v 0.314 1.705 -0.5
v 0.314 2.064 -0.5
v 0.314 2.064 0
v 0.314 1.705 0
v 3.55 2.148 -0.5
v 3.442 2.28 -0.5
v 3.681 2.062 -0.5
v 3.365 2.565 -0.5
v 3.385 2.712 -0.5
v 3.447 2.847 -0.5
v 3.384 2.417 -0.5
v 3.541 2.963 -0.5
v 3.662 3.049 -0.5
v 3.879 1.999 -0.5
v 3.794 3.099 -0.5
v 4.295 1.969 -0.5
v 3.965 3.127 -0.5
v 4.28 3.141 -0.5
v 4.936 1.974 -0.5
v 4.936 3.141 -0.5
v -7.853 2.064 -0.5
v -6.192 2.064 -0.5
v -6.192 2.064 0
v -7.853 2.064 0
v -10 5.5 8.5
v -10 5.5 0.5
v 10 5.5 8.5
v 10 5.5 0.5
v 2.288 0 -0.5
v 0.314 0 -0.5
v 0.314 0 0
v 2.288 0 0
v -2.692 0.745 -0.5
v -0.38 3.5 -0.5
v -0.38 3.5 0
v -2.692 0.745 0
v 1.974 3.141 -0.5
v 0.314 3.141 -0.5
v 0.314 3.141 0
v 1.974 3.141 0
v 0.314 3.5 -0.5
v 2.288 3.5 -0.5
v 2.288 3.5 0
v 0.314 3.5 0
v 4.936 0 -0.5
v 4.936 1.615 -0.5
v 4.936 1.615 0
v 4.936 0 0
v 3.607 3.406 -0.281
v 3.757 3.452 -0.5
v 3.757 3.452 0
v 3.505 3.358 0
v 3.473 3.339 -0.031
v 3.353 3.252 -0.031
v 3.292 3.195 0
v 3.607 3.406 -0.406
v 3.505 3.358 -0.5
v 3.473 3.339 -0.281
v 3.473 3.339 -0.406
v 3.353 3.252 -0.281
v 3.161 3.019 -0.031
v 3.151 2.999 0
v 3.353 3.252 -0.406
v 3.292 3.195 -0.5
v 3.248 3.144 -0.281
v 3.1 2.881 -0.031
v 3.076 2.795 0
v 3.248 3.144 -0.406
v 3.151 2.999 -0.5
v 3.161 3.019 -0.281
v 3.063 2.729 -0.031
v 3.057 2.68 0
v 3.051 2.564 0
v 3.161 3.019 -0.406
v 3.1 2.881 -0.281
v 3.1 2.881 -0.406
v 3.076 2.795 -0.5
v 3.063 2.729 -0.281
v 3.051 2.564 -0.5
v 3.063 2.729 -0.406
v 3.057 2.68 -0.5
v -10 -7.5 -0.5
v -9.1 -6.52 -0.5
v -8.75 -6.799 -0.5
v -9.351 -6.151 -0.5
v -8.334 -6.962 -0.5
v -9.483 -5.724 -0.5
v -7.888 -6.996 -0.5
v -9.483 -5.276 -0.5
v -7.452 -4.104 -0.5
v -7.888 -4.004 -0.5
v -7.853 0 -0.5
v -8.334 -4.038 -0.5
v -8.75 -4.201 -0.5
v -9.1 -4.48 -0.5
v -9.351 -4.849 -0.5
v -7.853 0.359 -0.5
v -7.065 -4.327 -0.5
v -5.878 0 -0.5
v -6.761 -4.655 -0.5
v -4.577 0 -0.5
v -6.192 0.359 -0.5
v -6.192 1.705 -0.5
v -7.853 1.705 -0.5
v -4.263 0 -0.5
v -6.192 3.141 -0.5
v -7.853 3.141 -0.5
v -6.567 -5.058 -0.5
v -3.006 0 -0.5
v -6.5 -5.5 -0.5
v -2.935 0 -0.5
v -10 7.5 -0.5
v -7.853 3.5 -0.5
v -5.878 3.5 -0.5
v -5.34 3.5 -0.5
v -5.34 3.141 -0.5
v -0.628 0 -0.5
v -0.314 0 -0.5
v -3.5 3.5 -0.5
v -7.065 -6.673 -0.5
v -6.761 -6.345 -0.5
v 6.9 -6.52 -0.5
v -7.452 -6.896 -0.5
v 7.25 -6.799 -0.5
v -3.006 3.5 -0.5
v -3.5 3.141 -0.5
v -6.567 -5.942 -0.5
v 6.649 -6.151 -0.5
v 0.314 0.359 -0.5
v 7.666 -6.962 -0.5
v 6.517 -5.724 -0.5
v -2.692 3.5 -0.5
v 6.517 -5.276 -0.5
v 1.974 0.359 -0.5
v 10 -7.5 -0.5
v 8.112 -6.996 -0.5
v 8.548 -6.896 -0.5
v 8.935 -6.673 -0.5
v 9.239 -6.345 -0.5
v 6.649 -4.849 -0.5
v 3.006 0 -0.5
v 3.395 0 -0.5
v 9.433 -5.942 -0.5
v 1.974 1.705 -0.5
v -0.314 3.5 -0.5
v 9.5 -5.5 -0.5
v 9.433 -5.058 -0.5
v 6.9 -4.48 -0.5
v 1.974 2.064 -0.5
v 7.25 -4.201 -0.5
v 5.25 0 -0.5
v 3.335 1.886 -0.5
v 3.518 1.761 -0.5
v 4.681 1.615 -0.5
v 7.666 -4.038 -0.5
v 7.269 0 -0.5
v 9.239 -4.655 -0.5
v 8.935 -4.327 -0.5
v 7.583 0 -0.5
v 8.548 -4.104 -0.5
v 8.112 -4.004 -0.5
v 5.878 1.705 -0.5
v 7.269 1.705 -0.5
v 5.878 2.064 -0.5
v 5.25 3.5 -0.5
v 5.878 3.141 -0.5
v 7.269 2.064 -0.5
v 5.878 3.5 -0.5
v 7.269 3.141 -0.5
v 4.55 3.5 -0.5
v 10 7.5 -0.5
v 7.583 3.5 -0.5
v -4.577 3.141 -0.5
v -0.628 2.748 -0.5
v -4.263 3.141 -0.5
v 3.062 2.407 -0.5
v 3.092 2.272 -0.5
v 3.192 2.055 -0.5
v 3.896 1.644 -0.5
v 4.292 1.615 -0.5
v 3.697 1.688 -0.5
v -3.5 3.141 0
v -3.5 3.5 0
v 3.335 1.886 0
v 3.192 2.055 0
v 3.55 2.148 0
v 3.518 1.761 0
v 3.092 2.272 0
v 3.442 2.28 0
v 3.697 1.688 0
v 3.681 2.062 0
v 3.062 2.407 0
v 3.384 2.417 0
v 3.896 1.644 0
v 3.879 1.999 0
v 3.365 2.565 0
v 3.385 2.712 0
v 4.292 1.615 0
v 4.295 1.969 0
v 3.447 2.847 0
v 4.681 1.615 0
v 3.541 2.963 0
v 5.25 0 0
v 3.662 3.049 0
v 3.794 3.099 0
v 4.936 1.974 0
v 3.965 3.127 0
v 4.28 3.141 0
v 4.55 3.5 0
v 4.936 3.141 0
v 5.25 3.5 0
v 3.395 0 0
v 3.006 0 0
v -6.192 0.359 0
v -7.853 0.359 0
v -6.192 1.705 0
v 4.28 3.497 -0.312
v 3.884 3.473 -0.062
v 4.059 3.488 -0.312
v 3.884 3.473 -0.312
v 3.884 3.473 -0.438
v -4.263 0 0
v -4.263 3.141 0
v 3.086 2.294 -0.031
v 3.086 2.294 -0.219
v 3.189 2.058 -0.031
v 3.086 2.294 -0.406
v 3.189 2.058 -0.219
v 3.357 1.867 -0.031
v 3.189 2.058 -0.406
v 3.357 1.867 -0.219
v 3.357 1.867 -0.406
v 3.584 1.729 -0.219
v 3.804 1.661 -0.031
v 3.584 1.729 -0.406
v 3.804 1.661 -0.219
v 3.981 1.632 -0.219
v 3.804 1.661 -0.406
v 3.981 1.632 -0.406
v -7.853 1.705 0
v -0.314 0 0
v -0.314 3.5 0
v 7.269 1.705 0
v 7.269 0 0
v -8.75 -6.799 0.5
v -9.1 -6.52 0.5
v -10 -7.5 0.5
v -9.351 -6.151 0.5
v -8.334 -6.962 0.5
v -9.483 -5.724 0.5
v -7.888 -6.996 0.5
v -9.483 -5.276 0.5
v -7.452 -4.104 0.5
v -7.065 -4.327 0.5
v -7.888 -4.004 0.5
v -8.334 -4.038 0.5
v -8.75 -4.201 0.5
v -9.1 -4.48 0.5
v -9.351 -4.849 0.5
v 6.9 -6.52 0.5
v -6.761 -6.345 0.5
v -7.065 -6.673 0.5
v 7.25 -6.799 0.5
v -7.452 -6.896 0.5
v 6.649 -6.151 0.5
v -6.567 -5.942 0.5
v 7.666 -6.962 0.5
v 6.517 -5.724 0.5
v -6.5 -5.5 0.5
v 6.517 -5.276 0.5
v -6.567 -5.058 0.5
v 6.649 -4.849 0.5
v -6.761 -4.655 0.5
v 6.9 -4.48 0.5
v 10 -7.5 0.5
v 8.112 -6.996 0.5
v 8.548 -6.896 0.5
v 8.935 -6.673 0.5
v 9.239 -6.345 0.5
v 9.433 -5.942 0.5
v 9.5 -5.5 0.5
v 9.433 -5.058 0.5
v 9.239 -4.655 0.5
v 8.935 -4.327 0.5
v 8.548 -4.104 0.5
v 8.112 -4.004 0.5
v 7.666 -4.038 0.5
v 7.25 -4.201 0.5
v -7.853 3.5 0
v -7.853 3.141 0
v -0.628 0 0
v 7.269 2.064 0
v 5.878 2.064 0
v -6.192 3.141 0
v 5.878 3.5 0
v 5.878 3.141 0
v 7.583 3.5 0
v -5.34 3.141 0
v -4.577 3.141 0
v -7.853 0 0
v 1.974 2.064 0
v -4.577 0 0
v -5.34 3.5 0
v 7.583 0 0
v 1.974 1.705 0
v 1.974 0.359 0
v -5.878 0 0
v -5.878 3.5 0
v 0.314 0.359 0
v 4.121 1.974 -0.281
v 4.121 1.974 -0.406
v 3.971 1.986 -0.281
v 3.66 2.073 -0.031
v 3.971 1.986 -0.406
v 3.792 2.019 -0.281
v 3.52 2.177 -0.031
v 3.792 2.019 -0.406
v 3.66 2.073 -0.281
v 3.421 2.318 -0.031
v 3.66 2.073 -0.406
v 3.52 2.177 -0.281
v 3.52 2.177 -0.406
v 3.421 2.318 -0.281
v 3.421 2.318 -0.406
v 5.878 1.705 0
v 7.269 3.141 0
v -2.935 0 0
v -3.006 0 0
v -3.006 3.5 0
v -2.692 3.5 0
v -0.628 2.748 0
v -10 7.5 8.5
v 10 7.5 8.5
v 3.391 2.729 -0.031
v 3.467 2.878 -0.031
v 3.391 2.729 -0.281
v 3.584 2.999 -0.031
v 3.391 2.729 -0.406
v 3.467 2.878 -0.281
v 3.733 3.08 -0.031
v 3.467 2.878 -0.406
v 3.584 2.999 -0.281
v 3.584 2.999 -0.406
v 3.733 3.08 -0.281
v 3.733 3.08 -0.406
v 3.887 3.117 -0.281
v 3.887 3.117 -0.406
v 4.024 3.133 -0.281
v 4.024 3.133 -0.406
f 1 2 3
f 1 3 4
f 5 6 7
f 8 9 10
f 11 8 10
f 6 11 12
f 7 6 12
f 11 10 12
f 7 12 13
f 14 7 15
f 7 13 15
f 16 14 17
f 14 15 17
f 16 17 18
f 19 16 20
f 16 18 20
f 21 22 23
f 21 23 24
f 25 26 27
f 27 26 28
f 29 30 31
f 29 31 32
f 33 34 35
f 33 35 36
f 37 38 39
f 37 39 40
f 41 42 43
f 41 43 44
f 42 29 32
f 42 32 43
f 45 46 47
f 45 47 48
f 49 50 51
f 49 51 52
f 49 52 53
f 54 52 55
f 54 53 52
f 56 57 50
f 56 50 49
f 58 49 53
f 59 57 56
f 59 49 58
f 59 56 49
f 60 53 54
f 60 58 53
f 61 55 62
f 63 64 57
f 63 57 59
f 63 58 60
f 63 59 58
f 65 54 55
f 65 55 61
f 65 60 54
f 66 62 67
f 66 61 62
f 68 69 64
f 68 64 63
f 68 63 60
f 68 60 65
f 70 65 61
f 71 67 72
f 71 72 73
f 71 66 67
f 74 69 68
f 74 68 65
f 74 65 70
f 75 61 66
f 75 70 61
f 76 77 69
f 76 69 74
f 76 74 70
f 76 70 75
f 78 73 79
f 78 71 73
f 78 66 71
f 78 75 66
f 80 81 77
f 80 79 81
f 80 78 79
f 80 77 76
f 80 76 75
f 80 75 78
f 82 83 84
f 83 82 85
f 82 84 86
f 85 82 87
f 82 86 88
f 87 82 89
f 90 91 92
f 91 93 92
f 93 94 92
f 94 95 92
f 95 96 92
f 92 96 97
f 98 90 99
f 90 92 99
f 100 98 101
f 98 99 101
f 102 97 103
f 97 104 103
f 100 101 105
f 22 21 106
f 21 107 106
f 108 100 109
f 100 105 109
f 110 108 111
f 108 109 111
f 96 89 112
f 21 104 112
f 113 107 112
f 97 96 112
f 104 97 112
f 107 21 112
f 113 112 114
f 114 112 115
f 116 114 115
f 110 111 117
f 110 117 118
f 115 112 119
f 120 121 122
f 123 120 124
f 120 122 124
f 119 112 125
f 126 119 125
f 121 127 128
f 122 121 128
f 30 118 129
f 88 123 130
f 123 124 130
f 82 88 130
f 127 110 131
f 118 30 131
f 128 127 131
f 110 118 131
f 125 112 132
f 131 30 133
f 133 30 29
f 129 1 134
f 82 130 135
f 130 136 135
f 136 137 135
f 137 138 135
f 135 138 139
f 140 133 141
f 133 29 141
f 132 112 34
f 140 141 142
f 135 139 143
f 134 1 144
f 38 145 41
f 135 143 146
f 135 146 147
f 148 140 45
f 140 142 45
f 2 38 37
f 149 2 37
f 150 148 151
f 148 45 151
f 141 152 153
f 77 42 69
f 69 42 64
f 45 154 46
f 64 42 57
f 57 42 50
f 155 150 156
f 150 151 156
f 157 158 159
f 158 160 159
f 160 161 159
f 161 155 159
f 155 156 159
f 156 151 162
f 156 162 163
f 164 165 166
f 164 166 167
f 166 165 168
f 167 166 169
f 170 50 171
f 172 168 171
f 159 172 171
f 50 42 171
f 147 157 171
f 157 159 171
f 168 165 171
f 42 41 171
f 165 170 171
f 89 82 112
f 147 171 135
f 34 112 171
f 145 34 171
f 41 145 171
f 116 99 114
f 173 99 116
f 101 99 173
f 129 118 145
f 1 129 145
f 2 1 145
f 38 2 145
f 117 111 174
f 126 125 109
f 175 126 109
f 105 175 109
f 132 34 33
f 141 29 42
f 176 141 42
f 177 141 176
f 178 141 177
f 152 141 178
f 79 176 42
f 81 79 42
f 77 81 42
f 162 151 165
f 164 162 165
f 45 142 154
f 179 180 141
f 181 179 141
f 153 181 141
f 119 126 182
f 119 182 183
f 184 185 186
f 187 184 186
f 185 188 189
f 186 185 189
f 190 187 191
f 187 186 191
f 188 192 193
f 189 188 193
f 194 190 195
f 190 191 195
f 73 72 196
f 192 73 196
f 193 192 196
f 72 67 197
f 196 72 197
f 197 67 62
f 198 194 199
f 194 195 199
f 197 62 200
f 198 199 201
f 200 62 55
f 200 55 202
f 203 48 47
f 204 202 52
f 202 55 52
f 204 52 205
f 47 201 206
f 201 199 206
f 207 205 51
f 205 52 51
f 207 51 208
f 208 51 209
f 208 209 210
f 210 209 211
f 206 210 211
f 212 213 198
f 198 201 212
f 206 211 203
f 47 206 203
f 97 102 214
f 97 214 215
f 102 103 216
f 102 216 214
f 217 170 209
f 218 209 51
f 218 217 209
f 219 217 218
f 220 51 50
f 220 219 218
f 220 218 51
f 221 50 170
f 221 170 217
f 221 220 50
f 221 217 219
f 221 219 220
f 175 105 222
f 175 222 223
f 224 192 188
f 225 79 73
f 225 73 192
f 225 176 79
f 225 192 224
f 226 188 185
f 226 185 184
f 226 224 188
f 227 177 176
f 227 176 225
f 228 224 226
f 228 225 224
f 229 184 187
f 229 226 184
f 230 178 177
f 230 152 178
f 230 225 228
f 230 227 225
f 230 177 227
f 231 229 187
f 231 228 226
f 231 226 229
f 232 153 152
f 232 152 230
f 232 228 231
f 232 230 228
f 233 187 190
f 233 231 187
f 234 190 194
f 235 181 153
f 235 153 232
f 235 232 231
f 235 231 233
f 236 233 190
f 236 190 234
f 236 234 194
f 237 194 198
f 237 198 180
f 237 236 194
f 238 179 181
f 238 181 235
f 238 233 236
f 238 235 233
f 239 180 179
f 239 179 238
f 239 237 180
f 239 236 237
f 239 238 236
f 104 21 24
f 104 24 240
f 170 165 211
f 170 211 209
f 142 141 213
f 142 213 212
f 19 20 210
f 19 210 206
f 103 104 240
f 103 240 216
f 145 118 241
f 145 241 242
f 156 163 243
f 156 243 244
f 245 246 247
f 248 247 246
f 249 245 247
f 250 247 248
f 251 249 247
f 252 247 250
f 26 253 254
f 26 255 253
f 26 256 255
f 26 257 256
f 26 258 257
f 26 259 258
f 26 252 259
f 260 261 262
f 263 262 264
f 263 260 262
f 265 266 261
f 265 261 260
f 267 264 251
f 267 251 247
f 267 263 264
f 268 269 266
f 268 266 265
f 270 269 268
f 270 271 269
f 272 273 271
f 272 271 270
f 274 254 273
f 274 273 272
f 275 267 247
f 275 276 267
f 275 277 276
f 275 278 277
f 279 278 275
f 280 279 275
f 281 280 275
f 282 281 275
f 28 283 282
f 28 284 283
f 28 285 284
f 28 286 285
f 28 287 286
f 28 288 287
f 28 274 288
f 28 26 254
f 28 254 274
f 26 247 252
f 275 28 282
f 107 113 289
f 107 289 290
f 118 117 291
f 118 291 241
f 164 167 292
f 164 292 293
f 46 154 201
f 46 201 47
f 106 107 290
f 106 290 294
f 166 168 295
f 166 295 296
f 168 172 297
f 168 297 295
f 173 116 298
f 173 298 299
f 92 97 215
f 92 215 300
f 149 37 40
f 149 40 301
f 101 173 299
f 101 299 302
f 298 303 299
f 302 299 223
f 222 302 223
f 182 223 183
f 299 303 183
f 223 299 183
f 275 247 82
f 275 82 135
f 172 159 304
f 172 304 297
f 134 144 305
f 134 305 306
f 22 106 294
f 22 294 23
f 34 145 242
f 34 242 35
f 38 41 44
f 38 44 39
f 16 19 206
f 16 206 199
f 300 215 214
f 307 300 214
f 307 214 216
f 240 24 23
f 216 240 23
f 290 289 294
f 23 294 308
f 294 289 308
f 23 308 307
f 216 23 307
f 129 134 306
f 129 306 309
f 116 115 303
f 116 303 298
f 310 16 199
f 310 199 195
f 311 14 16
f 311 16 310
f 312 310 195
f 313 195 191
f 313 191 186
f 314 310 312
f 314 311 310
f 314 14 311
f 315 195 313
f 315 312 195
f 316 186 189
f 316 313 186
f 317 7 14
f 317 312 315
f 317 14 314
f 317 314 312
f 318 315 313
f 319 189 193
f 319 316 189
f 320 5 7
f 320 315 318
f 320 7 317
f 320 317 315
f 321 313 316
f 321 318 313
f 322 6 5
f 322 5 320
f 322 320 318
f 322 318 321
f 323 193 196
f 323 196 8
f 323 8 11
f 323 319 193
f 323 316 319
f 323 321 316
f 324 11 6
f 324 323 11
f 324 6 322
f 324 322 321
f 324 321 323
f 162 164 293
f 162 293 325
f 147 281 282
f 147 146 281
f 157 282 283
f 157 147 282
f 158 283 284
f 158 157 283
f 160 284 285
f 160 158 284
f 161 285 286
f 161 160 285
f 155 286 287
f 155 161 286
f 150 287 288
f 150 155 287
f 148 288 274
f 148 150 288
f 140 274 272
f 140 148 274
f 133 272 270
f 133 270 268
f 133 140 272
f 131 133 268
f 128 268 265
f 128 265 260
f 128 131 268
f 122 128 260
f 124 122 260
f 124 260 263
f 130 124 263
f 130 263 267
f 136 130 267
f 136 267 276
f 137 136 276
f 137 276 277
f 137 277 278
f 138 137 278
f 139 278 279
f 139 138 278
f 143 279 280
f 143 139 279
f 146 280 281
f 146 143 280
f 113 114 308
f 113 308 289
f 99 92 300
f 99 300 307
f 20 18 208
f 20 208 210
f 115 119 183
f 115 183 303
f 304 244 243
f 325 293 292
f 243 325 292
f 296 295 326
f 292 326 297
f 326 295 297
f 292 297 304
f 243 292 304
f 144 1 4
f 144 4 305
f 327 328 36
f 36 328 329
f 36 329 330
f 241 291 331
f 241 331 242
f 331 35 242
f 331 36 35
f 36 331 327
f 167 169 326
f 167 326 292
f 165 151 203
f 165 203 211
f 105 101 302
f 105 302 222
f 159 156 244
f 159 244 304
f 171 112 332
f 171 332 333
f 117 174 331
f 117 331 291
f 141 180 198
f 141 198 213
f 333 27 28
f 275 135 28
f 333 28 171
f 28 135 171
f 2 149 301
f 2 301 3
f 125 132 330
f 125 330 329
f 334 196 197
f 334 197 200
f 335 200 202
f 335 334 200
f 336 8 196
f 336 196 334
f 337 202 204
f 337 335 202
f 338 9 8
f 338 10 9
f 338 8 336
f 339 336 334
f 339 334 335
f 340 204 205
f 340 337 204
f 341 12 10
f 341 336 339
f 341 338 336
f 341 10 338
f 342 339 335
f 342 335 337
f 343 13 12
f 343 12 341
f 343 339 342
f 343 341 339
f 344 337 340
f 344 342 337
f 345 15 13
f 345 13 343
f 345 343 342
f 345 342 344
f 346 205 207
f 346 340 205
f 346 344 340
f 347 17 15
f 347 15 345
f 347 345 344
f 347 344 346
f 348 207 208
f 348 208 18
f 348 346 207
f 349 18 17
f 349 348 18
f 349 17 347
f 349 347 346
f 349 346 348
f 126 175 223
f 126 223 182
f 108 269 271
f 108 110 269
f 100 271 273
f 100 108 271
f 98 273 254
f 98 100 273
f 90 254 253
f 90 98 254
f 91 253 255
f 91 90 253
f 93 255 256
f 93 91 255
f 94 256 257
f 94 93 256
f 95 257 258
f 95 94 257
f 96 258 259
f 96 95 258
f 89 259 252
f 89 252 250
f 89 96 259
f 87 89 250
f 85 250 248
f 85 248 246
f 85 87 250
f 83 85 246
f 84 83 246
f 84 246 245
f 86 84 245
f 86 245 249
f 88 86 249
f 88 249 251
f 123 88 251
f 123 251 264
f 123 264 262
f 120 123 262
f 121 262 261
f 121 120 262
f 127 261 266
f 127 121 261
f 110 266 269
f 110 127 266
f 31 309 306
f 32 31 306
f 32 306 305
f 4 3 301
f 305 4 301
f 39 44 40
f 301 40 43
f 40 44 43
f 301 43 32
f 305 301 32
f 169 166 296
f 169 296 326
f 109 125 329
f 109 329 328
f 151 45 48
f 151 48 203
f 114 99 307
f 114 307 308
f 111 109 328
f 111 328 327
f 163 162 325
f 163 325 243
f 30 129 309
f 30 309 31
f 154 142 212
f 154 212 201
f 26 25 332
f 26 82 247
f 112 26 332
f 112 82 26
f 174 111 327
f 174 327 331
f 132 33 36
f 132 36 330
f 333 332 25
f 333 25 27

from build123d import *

# Parameters (mm, degrees)
ESBO_O1_W                = 20
ESBO_O1_H                = 15
ESBO_O1_R                = 1.5
RESSALTO_EXTRUS_O1_DEPTH = 0.5
ESBO_O2_W                = 20
ESBO_O2_H                = 2
RESSALTO_EXTRUS_O2_DEPTH = 8
CORTE_EXTRUS_O1_DEPTH    = 0.5


with BuildPart() as part:
    # Esboço1 → Ressalto-extrusão1 (new, symmetric)
    with BuildSketch(Plane.XY):
        Rectangle(ESBO_O1_W, ESBO_O1_H)
        with Locations((-8, -5.5)):
            Circle(ESBO_O1_R, mode=Mode.SUBTRACT)
        with Locations((8, -5.5)):
            Circle(ESBO_O1_R, mode=Mode.SUBTRACT)
    extrude(amount=RESSALTO_EXTRUS_O1_DEPTH, both=True)

    # Esboço2 → Ressalto-extrusão2 (add)
    with BuildSketch(Plane.XY.offset(0.5)):
        with Locations((0, 6.5)):
            Rectangle(ESBO_O2_W, ESBO_O2_H)
    extrude(amount=RESSALTO_EXTRUS_O2_DEPTH)

    # Esboço3 → Corte-extrusão1 (cut)
    # profile 1 of 6: a face of its own
    with BuildSketch(Plane(origin=(0, 0, -0.5), x_dir=(-1, 0, 0), z_dir=(0, 0, -1))):
        Polygon((-7.583333333, 3.5), (-5.878205128, 3.5), (-5.878205128, 3.141025641), (-7.269230769, 3.141025641), (-7.269230769, 2.064102564), (-5.878205128, 2.064102564), (-5.878205128, 1.705128205), (-7.269230769, 1.705128205), (-7.269230769, 0), (-7.583333333, 0), align=None)
    # profile 2 of 6: a face of its own
    with BuildSketch(Plane(origin=(0, 0, -0.5), x_dir=(-1, 0, 0), z_dir=(0, 0, -1))):
        with BuildLine():
            Line((-5.25, 3.5), (-4.549579327, 3.5))
            add(Edge.make_bspline(
                [(-4.549579327, 3.5), (-4.502838198, 3.499844414), (-4.413090054, 3.499545672), (-4.284516784, 3.497879909), (-4.167689687, 3.493105553), (-4.062669847, 3.48899697), (-3.969459192, 3.481505028), (-3.887771902, 3.474344381), (-3.817984204, 3.46497072), (-3.775738353, 3.456265297), (-3.756610577, 3.452323718)],
                knots=[0, 0, 0, 0, 1.410062039, 2.707475311, 3.878576406, 4.937260626, 5.877586885, 6.699081471, 7.410979367, 8, 8, 8, 8], degree=3))
            add(Edge.make_bspline(
                [(-3.756610577, 3.452323718), (-3.731003953, 3.445996953), (-3.680336963, 3.433478389), (-3.607386897, 3.407018788), (-3.537872573, 3.376399163), (-3.472082749, 3.340435443), (-3.410346958, 3.298860663), (-3.352028647, 3.252392541), (-3.296863184, 3.201285335), (-3.247081553, 3.144250494), (-3.200142502, 3.084413984), (-3.160553875, 3.019710227), (-3.126427396, 2.9520487), (-3.099256879, 2.880741282), (-3.077378905, 2.80647951), (-3.061952666, 2.728590713), (-3.052701478, 2.647429738), (-3.051759623, 2.59207183), (-3.051282051, 2.564002404)],
                knots=[0, 0, 0, 0, 1.027469482, 2.033020251, 3.019912614, 3.986113645, 4.951240523, 5.91722682, 6.890402269, 7.87763091, 8.8651537, 9.85103654, 10.82876324, 11.815024772, 12.821070561, 13.842952187, 14.906261191, 16, 16, 16, 16], degree=3))
            add(Edge.make_bspline(
                [(-3.051282051, 2.564002404), (-3.052751049, 2.517367299), (-3.055617445, 2.426370131), (-3.082342549, 2.29430925), (-3.126119069, 2.171119935), (-3.186442358, 2.056957297), (-3.263261833, 1.954046652), (-3.355586624, 1.863656197), (-3.463468236, 1.788016284), (-3.563897552, 1.735563479), (-3.652611752, 1.701970571), (-3.725645064, 1.678334212), (-3.805312042, 1.660072247), (-3.890849376, 1.643712115), (-3.982613032, 1.63136042), (-4.080383071, 1.622313826), (-4.184229223, 1.616659777), (-4.255568292, 1.615817772), (-4.292267628, 1.615384615)],
                knots=[0, 0, 0, 0, 1.260483769, 2.459530307, 3.627416485, 4.787058657, 5.939039949, 7.08810263, 8.267026773, 9.491475466, 10.141966685, 10.831826277, 11.566392101, 12.351337768, 13.187381173, 14.07005841, 15.007169909, 16, 16, 16, 16], degree=3))
            Line((-4.292267628, 1.615384615), (-3.006410256, 0))
            Line((-3.006410256, 0), (-3.394831731, 0))
            Line((-3.394831731, 0), (-4.680689103, 1.615384615))
            Line((-4.680689103, 1.615384615), (-4.935897436, 1.615384615))
            Line((-4.935897436, 1.615384615), (-4.935897436, 0))
            Line((-4.935897436, 0), (-5.25, 0))
            Line((-5.25, 0), (-5.25, 3.5))
        make_face()
        with BuildLine():
            Line((-4.935897436, 3.141025641), (-4.935897436, 1.974358974))
            Line((-4.935897436, 1.974358974), (-4.295072115, 1.969451122))
            add(Edge.make_bspline(
                [(-4.295072115, 1.969451122), (-4.265152076, 1.969437885), (-4.207158519, 1.969412229), (-4.123257855, 1.973406005), (-4.045137743, 1.977949323), (-3.973096991, 1.984898669), (-3.907103415, 1.99385474), (-3.847190002, 2.005057725), (-3.79325895, 2.018109787), (-3.730360412, 2.038311413), (-3.66012388, 2.070317431), (-3.583792421, 2.11688293), (-3.518790083, 2.175452049), (-3.463872221, 2.242425505), (-3.419742789, 2.316061754), (-3.388630735, 2.395478123), (-3.368888292, 2.478669721), (-3.366559747, 2.535847829), (-3.365384615, 2.564703526)],
                knots=[0, 0, 0, 0, 1.146690395, 2.22261258, 3.21895312, 4.145990853, 4.996080663, 5.770904154, 6.481378293, 7.121626537, 8.300444488, 9.431385265, 10.535395872, 11.636531494, 12.74115979, 13.810798291, 14.895190096, 16, 16, 16, 16], degree=3))
            add(Edge.make_bspline(
                [(-3.365384615, 2.564703526), (-3.366586736, 2.592850099), (-3.368968902, 2.648626338), (-3.38841767, 2.730282248), (-3.421307052, 2.807349198), (-3.46562929, 2.879513683), (-3.519628445, 2.945019419), (-3.582946257, 3.001066572), (-3.653851452, 3.047316037), (-3.720122651, 3.076870418), (-3.779356863, 3.094990271), (-3.830786523, 3.107741435), (-3.888898001, 3.117985904), (-3.95397346, 3.126193964), (-4.02573509, 3.133248909), (-4.104545742, 3.138000687), (-4.189882522, 3.140814551), (-4.249029453, 3.14095364), (-4.279647436, 3.141025641)],
                knots=[0, 0, 0, 0, 1.101028733, 2.181837193, 3.264309656, 4.369019818, 5.486613113, 6.575447106, 7.666700264, 8.788928104, 9.402425223, 10.0903467, 10.862060571, 11.710948788, 12.657782767, 13.684531032, 14.801375019, 16, 16, 16, 16], degree=3))
            Line((-4.279647436, 3.141025641), (-4.935897436, 3.141025641))
        make_face(mode=Mode.SUBTRACT)
    # profile 3 of 6: a face of its own
    with BuildSketch(Plane(origin=(0, 0, -0.5), x_dir=(-1, 0, 0), z_dir=(0, 0, -1))):
        Polygon((-2.288461538, 3.5), (-0.314102564, 3.5), (-0.314102564, 3.141025641), (-1.974358974, 3.141025641), (-1.974358974, 2.064102564), (-0.314102564, 2.064102564), (-0.314102564, 1.705128205), (-1.974358974, 1.705128205), (-1.974358974, 0.358974359), (-0.314102564, 0.358974359), (-0.314102564, 0), (-2.288461538, 0), align=None)
    # profile 4 of 6: a face of its own
    with BuildSketch(Plane(origin=(0, 0, -0.5), x_dir=(-1, 0, 0), z_dir=(0, 0, -1))):
        Polygon((0.314102564, 0), (0.314102564, 3.5), (0.380008013, 3.5), (2.692307692, 0.745292468), (2.692307692, 3.5), (3.006410256, 3.5), (3.006410256, 0), (2.934895833, 0), (0.628205128, 2.748397436), (0.628205128, 0), align=None)
    # profile 5 of 6: a face of its own
    with BuildSketch(Plane(origin=(0, 0, -0.5), x_dir=(-1, 0, 0), z_dir=(0, 0, -1))):
        Polygon((3.5, 3.141025641), (3.5, 3.5), (5.33974359, 3.5), (5.33974359, 3.141025641), (4.576923077, 3.141025641), (4.576923077, 0), (4.262820513, 0), (4.262820513, 3.141025641), align=None)
    # profile 6 of 6: a face of its own
    with BuildSketch(Plane(origin=(0, 0, -0.5), x_dir=(-1, 0, 0), z_dir=(0, 0, -1))):
        Polygon((5.878205128, 3.5), (7.852564103, 3.5), (7.852564103, 3.141025641), (6.192307692, 3.141025641), (6.192307692, 2.064102564), (7.852564103, 2.064102564), (7.852564103, 1.705128205), (6.192307692, 1.705128205), (6.192307692, 0.358974359), (7.852564103, 0.358974359), (7.852564103, 0), (5.878205128, 0), align=None)
    extrude(amount=-CORTE_EXTRUS_O1_DEPTH, mode=Mode.SUBTRACT)


solid = part.part
